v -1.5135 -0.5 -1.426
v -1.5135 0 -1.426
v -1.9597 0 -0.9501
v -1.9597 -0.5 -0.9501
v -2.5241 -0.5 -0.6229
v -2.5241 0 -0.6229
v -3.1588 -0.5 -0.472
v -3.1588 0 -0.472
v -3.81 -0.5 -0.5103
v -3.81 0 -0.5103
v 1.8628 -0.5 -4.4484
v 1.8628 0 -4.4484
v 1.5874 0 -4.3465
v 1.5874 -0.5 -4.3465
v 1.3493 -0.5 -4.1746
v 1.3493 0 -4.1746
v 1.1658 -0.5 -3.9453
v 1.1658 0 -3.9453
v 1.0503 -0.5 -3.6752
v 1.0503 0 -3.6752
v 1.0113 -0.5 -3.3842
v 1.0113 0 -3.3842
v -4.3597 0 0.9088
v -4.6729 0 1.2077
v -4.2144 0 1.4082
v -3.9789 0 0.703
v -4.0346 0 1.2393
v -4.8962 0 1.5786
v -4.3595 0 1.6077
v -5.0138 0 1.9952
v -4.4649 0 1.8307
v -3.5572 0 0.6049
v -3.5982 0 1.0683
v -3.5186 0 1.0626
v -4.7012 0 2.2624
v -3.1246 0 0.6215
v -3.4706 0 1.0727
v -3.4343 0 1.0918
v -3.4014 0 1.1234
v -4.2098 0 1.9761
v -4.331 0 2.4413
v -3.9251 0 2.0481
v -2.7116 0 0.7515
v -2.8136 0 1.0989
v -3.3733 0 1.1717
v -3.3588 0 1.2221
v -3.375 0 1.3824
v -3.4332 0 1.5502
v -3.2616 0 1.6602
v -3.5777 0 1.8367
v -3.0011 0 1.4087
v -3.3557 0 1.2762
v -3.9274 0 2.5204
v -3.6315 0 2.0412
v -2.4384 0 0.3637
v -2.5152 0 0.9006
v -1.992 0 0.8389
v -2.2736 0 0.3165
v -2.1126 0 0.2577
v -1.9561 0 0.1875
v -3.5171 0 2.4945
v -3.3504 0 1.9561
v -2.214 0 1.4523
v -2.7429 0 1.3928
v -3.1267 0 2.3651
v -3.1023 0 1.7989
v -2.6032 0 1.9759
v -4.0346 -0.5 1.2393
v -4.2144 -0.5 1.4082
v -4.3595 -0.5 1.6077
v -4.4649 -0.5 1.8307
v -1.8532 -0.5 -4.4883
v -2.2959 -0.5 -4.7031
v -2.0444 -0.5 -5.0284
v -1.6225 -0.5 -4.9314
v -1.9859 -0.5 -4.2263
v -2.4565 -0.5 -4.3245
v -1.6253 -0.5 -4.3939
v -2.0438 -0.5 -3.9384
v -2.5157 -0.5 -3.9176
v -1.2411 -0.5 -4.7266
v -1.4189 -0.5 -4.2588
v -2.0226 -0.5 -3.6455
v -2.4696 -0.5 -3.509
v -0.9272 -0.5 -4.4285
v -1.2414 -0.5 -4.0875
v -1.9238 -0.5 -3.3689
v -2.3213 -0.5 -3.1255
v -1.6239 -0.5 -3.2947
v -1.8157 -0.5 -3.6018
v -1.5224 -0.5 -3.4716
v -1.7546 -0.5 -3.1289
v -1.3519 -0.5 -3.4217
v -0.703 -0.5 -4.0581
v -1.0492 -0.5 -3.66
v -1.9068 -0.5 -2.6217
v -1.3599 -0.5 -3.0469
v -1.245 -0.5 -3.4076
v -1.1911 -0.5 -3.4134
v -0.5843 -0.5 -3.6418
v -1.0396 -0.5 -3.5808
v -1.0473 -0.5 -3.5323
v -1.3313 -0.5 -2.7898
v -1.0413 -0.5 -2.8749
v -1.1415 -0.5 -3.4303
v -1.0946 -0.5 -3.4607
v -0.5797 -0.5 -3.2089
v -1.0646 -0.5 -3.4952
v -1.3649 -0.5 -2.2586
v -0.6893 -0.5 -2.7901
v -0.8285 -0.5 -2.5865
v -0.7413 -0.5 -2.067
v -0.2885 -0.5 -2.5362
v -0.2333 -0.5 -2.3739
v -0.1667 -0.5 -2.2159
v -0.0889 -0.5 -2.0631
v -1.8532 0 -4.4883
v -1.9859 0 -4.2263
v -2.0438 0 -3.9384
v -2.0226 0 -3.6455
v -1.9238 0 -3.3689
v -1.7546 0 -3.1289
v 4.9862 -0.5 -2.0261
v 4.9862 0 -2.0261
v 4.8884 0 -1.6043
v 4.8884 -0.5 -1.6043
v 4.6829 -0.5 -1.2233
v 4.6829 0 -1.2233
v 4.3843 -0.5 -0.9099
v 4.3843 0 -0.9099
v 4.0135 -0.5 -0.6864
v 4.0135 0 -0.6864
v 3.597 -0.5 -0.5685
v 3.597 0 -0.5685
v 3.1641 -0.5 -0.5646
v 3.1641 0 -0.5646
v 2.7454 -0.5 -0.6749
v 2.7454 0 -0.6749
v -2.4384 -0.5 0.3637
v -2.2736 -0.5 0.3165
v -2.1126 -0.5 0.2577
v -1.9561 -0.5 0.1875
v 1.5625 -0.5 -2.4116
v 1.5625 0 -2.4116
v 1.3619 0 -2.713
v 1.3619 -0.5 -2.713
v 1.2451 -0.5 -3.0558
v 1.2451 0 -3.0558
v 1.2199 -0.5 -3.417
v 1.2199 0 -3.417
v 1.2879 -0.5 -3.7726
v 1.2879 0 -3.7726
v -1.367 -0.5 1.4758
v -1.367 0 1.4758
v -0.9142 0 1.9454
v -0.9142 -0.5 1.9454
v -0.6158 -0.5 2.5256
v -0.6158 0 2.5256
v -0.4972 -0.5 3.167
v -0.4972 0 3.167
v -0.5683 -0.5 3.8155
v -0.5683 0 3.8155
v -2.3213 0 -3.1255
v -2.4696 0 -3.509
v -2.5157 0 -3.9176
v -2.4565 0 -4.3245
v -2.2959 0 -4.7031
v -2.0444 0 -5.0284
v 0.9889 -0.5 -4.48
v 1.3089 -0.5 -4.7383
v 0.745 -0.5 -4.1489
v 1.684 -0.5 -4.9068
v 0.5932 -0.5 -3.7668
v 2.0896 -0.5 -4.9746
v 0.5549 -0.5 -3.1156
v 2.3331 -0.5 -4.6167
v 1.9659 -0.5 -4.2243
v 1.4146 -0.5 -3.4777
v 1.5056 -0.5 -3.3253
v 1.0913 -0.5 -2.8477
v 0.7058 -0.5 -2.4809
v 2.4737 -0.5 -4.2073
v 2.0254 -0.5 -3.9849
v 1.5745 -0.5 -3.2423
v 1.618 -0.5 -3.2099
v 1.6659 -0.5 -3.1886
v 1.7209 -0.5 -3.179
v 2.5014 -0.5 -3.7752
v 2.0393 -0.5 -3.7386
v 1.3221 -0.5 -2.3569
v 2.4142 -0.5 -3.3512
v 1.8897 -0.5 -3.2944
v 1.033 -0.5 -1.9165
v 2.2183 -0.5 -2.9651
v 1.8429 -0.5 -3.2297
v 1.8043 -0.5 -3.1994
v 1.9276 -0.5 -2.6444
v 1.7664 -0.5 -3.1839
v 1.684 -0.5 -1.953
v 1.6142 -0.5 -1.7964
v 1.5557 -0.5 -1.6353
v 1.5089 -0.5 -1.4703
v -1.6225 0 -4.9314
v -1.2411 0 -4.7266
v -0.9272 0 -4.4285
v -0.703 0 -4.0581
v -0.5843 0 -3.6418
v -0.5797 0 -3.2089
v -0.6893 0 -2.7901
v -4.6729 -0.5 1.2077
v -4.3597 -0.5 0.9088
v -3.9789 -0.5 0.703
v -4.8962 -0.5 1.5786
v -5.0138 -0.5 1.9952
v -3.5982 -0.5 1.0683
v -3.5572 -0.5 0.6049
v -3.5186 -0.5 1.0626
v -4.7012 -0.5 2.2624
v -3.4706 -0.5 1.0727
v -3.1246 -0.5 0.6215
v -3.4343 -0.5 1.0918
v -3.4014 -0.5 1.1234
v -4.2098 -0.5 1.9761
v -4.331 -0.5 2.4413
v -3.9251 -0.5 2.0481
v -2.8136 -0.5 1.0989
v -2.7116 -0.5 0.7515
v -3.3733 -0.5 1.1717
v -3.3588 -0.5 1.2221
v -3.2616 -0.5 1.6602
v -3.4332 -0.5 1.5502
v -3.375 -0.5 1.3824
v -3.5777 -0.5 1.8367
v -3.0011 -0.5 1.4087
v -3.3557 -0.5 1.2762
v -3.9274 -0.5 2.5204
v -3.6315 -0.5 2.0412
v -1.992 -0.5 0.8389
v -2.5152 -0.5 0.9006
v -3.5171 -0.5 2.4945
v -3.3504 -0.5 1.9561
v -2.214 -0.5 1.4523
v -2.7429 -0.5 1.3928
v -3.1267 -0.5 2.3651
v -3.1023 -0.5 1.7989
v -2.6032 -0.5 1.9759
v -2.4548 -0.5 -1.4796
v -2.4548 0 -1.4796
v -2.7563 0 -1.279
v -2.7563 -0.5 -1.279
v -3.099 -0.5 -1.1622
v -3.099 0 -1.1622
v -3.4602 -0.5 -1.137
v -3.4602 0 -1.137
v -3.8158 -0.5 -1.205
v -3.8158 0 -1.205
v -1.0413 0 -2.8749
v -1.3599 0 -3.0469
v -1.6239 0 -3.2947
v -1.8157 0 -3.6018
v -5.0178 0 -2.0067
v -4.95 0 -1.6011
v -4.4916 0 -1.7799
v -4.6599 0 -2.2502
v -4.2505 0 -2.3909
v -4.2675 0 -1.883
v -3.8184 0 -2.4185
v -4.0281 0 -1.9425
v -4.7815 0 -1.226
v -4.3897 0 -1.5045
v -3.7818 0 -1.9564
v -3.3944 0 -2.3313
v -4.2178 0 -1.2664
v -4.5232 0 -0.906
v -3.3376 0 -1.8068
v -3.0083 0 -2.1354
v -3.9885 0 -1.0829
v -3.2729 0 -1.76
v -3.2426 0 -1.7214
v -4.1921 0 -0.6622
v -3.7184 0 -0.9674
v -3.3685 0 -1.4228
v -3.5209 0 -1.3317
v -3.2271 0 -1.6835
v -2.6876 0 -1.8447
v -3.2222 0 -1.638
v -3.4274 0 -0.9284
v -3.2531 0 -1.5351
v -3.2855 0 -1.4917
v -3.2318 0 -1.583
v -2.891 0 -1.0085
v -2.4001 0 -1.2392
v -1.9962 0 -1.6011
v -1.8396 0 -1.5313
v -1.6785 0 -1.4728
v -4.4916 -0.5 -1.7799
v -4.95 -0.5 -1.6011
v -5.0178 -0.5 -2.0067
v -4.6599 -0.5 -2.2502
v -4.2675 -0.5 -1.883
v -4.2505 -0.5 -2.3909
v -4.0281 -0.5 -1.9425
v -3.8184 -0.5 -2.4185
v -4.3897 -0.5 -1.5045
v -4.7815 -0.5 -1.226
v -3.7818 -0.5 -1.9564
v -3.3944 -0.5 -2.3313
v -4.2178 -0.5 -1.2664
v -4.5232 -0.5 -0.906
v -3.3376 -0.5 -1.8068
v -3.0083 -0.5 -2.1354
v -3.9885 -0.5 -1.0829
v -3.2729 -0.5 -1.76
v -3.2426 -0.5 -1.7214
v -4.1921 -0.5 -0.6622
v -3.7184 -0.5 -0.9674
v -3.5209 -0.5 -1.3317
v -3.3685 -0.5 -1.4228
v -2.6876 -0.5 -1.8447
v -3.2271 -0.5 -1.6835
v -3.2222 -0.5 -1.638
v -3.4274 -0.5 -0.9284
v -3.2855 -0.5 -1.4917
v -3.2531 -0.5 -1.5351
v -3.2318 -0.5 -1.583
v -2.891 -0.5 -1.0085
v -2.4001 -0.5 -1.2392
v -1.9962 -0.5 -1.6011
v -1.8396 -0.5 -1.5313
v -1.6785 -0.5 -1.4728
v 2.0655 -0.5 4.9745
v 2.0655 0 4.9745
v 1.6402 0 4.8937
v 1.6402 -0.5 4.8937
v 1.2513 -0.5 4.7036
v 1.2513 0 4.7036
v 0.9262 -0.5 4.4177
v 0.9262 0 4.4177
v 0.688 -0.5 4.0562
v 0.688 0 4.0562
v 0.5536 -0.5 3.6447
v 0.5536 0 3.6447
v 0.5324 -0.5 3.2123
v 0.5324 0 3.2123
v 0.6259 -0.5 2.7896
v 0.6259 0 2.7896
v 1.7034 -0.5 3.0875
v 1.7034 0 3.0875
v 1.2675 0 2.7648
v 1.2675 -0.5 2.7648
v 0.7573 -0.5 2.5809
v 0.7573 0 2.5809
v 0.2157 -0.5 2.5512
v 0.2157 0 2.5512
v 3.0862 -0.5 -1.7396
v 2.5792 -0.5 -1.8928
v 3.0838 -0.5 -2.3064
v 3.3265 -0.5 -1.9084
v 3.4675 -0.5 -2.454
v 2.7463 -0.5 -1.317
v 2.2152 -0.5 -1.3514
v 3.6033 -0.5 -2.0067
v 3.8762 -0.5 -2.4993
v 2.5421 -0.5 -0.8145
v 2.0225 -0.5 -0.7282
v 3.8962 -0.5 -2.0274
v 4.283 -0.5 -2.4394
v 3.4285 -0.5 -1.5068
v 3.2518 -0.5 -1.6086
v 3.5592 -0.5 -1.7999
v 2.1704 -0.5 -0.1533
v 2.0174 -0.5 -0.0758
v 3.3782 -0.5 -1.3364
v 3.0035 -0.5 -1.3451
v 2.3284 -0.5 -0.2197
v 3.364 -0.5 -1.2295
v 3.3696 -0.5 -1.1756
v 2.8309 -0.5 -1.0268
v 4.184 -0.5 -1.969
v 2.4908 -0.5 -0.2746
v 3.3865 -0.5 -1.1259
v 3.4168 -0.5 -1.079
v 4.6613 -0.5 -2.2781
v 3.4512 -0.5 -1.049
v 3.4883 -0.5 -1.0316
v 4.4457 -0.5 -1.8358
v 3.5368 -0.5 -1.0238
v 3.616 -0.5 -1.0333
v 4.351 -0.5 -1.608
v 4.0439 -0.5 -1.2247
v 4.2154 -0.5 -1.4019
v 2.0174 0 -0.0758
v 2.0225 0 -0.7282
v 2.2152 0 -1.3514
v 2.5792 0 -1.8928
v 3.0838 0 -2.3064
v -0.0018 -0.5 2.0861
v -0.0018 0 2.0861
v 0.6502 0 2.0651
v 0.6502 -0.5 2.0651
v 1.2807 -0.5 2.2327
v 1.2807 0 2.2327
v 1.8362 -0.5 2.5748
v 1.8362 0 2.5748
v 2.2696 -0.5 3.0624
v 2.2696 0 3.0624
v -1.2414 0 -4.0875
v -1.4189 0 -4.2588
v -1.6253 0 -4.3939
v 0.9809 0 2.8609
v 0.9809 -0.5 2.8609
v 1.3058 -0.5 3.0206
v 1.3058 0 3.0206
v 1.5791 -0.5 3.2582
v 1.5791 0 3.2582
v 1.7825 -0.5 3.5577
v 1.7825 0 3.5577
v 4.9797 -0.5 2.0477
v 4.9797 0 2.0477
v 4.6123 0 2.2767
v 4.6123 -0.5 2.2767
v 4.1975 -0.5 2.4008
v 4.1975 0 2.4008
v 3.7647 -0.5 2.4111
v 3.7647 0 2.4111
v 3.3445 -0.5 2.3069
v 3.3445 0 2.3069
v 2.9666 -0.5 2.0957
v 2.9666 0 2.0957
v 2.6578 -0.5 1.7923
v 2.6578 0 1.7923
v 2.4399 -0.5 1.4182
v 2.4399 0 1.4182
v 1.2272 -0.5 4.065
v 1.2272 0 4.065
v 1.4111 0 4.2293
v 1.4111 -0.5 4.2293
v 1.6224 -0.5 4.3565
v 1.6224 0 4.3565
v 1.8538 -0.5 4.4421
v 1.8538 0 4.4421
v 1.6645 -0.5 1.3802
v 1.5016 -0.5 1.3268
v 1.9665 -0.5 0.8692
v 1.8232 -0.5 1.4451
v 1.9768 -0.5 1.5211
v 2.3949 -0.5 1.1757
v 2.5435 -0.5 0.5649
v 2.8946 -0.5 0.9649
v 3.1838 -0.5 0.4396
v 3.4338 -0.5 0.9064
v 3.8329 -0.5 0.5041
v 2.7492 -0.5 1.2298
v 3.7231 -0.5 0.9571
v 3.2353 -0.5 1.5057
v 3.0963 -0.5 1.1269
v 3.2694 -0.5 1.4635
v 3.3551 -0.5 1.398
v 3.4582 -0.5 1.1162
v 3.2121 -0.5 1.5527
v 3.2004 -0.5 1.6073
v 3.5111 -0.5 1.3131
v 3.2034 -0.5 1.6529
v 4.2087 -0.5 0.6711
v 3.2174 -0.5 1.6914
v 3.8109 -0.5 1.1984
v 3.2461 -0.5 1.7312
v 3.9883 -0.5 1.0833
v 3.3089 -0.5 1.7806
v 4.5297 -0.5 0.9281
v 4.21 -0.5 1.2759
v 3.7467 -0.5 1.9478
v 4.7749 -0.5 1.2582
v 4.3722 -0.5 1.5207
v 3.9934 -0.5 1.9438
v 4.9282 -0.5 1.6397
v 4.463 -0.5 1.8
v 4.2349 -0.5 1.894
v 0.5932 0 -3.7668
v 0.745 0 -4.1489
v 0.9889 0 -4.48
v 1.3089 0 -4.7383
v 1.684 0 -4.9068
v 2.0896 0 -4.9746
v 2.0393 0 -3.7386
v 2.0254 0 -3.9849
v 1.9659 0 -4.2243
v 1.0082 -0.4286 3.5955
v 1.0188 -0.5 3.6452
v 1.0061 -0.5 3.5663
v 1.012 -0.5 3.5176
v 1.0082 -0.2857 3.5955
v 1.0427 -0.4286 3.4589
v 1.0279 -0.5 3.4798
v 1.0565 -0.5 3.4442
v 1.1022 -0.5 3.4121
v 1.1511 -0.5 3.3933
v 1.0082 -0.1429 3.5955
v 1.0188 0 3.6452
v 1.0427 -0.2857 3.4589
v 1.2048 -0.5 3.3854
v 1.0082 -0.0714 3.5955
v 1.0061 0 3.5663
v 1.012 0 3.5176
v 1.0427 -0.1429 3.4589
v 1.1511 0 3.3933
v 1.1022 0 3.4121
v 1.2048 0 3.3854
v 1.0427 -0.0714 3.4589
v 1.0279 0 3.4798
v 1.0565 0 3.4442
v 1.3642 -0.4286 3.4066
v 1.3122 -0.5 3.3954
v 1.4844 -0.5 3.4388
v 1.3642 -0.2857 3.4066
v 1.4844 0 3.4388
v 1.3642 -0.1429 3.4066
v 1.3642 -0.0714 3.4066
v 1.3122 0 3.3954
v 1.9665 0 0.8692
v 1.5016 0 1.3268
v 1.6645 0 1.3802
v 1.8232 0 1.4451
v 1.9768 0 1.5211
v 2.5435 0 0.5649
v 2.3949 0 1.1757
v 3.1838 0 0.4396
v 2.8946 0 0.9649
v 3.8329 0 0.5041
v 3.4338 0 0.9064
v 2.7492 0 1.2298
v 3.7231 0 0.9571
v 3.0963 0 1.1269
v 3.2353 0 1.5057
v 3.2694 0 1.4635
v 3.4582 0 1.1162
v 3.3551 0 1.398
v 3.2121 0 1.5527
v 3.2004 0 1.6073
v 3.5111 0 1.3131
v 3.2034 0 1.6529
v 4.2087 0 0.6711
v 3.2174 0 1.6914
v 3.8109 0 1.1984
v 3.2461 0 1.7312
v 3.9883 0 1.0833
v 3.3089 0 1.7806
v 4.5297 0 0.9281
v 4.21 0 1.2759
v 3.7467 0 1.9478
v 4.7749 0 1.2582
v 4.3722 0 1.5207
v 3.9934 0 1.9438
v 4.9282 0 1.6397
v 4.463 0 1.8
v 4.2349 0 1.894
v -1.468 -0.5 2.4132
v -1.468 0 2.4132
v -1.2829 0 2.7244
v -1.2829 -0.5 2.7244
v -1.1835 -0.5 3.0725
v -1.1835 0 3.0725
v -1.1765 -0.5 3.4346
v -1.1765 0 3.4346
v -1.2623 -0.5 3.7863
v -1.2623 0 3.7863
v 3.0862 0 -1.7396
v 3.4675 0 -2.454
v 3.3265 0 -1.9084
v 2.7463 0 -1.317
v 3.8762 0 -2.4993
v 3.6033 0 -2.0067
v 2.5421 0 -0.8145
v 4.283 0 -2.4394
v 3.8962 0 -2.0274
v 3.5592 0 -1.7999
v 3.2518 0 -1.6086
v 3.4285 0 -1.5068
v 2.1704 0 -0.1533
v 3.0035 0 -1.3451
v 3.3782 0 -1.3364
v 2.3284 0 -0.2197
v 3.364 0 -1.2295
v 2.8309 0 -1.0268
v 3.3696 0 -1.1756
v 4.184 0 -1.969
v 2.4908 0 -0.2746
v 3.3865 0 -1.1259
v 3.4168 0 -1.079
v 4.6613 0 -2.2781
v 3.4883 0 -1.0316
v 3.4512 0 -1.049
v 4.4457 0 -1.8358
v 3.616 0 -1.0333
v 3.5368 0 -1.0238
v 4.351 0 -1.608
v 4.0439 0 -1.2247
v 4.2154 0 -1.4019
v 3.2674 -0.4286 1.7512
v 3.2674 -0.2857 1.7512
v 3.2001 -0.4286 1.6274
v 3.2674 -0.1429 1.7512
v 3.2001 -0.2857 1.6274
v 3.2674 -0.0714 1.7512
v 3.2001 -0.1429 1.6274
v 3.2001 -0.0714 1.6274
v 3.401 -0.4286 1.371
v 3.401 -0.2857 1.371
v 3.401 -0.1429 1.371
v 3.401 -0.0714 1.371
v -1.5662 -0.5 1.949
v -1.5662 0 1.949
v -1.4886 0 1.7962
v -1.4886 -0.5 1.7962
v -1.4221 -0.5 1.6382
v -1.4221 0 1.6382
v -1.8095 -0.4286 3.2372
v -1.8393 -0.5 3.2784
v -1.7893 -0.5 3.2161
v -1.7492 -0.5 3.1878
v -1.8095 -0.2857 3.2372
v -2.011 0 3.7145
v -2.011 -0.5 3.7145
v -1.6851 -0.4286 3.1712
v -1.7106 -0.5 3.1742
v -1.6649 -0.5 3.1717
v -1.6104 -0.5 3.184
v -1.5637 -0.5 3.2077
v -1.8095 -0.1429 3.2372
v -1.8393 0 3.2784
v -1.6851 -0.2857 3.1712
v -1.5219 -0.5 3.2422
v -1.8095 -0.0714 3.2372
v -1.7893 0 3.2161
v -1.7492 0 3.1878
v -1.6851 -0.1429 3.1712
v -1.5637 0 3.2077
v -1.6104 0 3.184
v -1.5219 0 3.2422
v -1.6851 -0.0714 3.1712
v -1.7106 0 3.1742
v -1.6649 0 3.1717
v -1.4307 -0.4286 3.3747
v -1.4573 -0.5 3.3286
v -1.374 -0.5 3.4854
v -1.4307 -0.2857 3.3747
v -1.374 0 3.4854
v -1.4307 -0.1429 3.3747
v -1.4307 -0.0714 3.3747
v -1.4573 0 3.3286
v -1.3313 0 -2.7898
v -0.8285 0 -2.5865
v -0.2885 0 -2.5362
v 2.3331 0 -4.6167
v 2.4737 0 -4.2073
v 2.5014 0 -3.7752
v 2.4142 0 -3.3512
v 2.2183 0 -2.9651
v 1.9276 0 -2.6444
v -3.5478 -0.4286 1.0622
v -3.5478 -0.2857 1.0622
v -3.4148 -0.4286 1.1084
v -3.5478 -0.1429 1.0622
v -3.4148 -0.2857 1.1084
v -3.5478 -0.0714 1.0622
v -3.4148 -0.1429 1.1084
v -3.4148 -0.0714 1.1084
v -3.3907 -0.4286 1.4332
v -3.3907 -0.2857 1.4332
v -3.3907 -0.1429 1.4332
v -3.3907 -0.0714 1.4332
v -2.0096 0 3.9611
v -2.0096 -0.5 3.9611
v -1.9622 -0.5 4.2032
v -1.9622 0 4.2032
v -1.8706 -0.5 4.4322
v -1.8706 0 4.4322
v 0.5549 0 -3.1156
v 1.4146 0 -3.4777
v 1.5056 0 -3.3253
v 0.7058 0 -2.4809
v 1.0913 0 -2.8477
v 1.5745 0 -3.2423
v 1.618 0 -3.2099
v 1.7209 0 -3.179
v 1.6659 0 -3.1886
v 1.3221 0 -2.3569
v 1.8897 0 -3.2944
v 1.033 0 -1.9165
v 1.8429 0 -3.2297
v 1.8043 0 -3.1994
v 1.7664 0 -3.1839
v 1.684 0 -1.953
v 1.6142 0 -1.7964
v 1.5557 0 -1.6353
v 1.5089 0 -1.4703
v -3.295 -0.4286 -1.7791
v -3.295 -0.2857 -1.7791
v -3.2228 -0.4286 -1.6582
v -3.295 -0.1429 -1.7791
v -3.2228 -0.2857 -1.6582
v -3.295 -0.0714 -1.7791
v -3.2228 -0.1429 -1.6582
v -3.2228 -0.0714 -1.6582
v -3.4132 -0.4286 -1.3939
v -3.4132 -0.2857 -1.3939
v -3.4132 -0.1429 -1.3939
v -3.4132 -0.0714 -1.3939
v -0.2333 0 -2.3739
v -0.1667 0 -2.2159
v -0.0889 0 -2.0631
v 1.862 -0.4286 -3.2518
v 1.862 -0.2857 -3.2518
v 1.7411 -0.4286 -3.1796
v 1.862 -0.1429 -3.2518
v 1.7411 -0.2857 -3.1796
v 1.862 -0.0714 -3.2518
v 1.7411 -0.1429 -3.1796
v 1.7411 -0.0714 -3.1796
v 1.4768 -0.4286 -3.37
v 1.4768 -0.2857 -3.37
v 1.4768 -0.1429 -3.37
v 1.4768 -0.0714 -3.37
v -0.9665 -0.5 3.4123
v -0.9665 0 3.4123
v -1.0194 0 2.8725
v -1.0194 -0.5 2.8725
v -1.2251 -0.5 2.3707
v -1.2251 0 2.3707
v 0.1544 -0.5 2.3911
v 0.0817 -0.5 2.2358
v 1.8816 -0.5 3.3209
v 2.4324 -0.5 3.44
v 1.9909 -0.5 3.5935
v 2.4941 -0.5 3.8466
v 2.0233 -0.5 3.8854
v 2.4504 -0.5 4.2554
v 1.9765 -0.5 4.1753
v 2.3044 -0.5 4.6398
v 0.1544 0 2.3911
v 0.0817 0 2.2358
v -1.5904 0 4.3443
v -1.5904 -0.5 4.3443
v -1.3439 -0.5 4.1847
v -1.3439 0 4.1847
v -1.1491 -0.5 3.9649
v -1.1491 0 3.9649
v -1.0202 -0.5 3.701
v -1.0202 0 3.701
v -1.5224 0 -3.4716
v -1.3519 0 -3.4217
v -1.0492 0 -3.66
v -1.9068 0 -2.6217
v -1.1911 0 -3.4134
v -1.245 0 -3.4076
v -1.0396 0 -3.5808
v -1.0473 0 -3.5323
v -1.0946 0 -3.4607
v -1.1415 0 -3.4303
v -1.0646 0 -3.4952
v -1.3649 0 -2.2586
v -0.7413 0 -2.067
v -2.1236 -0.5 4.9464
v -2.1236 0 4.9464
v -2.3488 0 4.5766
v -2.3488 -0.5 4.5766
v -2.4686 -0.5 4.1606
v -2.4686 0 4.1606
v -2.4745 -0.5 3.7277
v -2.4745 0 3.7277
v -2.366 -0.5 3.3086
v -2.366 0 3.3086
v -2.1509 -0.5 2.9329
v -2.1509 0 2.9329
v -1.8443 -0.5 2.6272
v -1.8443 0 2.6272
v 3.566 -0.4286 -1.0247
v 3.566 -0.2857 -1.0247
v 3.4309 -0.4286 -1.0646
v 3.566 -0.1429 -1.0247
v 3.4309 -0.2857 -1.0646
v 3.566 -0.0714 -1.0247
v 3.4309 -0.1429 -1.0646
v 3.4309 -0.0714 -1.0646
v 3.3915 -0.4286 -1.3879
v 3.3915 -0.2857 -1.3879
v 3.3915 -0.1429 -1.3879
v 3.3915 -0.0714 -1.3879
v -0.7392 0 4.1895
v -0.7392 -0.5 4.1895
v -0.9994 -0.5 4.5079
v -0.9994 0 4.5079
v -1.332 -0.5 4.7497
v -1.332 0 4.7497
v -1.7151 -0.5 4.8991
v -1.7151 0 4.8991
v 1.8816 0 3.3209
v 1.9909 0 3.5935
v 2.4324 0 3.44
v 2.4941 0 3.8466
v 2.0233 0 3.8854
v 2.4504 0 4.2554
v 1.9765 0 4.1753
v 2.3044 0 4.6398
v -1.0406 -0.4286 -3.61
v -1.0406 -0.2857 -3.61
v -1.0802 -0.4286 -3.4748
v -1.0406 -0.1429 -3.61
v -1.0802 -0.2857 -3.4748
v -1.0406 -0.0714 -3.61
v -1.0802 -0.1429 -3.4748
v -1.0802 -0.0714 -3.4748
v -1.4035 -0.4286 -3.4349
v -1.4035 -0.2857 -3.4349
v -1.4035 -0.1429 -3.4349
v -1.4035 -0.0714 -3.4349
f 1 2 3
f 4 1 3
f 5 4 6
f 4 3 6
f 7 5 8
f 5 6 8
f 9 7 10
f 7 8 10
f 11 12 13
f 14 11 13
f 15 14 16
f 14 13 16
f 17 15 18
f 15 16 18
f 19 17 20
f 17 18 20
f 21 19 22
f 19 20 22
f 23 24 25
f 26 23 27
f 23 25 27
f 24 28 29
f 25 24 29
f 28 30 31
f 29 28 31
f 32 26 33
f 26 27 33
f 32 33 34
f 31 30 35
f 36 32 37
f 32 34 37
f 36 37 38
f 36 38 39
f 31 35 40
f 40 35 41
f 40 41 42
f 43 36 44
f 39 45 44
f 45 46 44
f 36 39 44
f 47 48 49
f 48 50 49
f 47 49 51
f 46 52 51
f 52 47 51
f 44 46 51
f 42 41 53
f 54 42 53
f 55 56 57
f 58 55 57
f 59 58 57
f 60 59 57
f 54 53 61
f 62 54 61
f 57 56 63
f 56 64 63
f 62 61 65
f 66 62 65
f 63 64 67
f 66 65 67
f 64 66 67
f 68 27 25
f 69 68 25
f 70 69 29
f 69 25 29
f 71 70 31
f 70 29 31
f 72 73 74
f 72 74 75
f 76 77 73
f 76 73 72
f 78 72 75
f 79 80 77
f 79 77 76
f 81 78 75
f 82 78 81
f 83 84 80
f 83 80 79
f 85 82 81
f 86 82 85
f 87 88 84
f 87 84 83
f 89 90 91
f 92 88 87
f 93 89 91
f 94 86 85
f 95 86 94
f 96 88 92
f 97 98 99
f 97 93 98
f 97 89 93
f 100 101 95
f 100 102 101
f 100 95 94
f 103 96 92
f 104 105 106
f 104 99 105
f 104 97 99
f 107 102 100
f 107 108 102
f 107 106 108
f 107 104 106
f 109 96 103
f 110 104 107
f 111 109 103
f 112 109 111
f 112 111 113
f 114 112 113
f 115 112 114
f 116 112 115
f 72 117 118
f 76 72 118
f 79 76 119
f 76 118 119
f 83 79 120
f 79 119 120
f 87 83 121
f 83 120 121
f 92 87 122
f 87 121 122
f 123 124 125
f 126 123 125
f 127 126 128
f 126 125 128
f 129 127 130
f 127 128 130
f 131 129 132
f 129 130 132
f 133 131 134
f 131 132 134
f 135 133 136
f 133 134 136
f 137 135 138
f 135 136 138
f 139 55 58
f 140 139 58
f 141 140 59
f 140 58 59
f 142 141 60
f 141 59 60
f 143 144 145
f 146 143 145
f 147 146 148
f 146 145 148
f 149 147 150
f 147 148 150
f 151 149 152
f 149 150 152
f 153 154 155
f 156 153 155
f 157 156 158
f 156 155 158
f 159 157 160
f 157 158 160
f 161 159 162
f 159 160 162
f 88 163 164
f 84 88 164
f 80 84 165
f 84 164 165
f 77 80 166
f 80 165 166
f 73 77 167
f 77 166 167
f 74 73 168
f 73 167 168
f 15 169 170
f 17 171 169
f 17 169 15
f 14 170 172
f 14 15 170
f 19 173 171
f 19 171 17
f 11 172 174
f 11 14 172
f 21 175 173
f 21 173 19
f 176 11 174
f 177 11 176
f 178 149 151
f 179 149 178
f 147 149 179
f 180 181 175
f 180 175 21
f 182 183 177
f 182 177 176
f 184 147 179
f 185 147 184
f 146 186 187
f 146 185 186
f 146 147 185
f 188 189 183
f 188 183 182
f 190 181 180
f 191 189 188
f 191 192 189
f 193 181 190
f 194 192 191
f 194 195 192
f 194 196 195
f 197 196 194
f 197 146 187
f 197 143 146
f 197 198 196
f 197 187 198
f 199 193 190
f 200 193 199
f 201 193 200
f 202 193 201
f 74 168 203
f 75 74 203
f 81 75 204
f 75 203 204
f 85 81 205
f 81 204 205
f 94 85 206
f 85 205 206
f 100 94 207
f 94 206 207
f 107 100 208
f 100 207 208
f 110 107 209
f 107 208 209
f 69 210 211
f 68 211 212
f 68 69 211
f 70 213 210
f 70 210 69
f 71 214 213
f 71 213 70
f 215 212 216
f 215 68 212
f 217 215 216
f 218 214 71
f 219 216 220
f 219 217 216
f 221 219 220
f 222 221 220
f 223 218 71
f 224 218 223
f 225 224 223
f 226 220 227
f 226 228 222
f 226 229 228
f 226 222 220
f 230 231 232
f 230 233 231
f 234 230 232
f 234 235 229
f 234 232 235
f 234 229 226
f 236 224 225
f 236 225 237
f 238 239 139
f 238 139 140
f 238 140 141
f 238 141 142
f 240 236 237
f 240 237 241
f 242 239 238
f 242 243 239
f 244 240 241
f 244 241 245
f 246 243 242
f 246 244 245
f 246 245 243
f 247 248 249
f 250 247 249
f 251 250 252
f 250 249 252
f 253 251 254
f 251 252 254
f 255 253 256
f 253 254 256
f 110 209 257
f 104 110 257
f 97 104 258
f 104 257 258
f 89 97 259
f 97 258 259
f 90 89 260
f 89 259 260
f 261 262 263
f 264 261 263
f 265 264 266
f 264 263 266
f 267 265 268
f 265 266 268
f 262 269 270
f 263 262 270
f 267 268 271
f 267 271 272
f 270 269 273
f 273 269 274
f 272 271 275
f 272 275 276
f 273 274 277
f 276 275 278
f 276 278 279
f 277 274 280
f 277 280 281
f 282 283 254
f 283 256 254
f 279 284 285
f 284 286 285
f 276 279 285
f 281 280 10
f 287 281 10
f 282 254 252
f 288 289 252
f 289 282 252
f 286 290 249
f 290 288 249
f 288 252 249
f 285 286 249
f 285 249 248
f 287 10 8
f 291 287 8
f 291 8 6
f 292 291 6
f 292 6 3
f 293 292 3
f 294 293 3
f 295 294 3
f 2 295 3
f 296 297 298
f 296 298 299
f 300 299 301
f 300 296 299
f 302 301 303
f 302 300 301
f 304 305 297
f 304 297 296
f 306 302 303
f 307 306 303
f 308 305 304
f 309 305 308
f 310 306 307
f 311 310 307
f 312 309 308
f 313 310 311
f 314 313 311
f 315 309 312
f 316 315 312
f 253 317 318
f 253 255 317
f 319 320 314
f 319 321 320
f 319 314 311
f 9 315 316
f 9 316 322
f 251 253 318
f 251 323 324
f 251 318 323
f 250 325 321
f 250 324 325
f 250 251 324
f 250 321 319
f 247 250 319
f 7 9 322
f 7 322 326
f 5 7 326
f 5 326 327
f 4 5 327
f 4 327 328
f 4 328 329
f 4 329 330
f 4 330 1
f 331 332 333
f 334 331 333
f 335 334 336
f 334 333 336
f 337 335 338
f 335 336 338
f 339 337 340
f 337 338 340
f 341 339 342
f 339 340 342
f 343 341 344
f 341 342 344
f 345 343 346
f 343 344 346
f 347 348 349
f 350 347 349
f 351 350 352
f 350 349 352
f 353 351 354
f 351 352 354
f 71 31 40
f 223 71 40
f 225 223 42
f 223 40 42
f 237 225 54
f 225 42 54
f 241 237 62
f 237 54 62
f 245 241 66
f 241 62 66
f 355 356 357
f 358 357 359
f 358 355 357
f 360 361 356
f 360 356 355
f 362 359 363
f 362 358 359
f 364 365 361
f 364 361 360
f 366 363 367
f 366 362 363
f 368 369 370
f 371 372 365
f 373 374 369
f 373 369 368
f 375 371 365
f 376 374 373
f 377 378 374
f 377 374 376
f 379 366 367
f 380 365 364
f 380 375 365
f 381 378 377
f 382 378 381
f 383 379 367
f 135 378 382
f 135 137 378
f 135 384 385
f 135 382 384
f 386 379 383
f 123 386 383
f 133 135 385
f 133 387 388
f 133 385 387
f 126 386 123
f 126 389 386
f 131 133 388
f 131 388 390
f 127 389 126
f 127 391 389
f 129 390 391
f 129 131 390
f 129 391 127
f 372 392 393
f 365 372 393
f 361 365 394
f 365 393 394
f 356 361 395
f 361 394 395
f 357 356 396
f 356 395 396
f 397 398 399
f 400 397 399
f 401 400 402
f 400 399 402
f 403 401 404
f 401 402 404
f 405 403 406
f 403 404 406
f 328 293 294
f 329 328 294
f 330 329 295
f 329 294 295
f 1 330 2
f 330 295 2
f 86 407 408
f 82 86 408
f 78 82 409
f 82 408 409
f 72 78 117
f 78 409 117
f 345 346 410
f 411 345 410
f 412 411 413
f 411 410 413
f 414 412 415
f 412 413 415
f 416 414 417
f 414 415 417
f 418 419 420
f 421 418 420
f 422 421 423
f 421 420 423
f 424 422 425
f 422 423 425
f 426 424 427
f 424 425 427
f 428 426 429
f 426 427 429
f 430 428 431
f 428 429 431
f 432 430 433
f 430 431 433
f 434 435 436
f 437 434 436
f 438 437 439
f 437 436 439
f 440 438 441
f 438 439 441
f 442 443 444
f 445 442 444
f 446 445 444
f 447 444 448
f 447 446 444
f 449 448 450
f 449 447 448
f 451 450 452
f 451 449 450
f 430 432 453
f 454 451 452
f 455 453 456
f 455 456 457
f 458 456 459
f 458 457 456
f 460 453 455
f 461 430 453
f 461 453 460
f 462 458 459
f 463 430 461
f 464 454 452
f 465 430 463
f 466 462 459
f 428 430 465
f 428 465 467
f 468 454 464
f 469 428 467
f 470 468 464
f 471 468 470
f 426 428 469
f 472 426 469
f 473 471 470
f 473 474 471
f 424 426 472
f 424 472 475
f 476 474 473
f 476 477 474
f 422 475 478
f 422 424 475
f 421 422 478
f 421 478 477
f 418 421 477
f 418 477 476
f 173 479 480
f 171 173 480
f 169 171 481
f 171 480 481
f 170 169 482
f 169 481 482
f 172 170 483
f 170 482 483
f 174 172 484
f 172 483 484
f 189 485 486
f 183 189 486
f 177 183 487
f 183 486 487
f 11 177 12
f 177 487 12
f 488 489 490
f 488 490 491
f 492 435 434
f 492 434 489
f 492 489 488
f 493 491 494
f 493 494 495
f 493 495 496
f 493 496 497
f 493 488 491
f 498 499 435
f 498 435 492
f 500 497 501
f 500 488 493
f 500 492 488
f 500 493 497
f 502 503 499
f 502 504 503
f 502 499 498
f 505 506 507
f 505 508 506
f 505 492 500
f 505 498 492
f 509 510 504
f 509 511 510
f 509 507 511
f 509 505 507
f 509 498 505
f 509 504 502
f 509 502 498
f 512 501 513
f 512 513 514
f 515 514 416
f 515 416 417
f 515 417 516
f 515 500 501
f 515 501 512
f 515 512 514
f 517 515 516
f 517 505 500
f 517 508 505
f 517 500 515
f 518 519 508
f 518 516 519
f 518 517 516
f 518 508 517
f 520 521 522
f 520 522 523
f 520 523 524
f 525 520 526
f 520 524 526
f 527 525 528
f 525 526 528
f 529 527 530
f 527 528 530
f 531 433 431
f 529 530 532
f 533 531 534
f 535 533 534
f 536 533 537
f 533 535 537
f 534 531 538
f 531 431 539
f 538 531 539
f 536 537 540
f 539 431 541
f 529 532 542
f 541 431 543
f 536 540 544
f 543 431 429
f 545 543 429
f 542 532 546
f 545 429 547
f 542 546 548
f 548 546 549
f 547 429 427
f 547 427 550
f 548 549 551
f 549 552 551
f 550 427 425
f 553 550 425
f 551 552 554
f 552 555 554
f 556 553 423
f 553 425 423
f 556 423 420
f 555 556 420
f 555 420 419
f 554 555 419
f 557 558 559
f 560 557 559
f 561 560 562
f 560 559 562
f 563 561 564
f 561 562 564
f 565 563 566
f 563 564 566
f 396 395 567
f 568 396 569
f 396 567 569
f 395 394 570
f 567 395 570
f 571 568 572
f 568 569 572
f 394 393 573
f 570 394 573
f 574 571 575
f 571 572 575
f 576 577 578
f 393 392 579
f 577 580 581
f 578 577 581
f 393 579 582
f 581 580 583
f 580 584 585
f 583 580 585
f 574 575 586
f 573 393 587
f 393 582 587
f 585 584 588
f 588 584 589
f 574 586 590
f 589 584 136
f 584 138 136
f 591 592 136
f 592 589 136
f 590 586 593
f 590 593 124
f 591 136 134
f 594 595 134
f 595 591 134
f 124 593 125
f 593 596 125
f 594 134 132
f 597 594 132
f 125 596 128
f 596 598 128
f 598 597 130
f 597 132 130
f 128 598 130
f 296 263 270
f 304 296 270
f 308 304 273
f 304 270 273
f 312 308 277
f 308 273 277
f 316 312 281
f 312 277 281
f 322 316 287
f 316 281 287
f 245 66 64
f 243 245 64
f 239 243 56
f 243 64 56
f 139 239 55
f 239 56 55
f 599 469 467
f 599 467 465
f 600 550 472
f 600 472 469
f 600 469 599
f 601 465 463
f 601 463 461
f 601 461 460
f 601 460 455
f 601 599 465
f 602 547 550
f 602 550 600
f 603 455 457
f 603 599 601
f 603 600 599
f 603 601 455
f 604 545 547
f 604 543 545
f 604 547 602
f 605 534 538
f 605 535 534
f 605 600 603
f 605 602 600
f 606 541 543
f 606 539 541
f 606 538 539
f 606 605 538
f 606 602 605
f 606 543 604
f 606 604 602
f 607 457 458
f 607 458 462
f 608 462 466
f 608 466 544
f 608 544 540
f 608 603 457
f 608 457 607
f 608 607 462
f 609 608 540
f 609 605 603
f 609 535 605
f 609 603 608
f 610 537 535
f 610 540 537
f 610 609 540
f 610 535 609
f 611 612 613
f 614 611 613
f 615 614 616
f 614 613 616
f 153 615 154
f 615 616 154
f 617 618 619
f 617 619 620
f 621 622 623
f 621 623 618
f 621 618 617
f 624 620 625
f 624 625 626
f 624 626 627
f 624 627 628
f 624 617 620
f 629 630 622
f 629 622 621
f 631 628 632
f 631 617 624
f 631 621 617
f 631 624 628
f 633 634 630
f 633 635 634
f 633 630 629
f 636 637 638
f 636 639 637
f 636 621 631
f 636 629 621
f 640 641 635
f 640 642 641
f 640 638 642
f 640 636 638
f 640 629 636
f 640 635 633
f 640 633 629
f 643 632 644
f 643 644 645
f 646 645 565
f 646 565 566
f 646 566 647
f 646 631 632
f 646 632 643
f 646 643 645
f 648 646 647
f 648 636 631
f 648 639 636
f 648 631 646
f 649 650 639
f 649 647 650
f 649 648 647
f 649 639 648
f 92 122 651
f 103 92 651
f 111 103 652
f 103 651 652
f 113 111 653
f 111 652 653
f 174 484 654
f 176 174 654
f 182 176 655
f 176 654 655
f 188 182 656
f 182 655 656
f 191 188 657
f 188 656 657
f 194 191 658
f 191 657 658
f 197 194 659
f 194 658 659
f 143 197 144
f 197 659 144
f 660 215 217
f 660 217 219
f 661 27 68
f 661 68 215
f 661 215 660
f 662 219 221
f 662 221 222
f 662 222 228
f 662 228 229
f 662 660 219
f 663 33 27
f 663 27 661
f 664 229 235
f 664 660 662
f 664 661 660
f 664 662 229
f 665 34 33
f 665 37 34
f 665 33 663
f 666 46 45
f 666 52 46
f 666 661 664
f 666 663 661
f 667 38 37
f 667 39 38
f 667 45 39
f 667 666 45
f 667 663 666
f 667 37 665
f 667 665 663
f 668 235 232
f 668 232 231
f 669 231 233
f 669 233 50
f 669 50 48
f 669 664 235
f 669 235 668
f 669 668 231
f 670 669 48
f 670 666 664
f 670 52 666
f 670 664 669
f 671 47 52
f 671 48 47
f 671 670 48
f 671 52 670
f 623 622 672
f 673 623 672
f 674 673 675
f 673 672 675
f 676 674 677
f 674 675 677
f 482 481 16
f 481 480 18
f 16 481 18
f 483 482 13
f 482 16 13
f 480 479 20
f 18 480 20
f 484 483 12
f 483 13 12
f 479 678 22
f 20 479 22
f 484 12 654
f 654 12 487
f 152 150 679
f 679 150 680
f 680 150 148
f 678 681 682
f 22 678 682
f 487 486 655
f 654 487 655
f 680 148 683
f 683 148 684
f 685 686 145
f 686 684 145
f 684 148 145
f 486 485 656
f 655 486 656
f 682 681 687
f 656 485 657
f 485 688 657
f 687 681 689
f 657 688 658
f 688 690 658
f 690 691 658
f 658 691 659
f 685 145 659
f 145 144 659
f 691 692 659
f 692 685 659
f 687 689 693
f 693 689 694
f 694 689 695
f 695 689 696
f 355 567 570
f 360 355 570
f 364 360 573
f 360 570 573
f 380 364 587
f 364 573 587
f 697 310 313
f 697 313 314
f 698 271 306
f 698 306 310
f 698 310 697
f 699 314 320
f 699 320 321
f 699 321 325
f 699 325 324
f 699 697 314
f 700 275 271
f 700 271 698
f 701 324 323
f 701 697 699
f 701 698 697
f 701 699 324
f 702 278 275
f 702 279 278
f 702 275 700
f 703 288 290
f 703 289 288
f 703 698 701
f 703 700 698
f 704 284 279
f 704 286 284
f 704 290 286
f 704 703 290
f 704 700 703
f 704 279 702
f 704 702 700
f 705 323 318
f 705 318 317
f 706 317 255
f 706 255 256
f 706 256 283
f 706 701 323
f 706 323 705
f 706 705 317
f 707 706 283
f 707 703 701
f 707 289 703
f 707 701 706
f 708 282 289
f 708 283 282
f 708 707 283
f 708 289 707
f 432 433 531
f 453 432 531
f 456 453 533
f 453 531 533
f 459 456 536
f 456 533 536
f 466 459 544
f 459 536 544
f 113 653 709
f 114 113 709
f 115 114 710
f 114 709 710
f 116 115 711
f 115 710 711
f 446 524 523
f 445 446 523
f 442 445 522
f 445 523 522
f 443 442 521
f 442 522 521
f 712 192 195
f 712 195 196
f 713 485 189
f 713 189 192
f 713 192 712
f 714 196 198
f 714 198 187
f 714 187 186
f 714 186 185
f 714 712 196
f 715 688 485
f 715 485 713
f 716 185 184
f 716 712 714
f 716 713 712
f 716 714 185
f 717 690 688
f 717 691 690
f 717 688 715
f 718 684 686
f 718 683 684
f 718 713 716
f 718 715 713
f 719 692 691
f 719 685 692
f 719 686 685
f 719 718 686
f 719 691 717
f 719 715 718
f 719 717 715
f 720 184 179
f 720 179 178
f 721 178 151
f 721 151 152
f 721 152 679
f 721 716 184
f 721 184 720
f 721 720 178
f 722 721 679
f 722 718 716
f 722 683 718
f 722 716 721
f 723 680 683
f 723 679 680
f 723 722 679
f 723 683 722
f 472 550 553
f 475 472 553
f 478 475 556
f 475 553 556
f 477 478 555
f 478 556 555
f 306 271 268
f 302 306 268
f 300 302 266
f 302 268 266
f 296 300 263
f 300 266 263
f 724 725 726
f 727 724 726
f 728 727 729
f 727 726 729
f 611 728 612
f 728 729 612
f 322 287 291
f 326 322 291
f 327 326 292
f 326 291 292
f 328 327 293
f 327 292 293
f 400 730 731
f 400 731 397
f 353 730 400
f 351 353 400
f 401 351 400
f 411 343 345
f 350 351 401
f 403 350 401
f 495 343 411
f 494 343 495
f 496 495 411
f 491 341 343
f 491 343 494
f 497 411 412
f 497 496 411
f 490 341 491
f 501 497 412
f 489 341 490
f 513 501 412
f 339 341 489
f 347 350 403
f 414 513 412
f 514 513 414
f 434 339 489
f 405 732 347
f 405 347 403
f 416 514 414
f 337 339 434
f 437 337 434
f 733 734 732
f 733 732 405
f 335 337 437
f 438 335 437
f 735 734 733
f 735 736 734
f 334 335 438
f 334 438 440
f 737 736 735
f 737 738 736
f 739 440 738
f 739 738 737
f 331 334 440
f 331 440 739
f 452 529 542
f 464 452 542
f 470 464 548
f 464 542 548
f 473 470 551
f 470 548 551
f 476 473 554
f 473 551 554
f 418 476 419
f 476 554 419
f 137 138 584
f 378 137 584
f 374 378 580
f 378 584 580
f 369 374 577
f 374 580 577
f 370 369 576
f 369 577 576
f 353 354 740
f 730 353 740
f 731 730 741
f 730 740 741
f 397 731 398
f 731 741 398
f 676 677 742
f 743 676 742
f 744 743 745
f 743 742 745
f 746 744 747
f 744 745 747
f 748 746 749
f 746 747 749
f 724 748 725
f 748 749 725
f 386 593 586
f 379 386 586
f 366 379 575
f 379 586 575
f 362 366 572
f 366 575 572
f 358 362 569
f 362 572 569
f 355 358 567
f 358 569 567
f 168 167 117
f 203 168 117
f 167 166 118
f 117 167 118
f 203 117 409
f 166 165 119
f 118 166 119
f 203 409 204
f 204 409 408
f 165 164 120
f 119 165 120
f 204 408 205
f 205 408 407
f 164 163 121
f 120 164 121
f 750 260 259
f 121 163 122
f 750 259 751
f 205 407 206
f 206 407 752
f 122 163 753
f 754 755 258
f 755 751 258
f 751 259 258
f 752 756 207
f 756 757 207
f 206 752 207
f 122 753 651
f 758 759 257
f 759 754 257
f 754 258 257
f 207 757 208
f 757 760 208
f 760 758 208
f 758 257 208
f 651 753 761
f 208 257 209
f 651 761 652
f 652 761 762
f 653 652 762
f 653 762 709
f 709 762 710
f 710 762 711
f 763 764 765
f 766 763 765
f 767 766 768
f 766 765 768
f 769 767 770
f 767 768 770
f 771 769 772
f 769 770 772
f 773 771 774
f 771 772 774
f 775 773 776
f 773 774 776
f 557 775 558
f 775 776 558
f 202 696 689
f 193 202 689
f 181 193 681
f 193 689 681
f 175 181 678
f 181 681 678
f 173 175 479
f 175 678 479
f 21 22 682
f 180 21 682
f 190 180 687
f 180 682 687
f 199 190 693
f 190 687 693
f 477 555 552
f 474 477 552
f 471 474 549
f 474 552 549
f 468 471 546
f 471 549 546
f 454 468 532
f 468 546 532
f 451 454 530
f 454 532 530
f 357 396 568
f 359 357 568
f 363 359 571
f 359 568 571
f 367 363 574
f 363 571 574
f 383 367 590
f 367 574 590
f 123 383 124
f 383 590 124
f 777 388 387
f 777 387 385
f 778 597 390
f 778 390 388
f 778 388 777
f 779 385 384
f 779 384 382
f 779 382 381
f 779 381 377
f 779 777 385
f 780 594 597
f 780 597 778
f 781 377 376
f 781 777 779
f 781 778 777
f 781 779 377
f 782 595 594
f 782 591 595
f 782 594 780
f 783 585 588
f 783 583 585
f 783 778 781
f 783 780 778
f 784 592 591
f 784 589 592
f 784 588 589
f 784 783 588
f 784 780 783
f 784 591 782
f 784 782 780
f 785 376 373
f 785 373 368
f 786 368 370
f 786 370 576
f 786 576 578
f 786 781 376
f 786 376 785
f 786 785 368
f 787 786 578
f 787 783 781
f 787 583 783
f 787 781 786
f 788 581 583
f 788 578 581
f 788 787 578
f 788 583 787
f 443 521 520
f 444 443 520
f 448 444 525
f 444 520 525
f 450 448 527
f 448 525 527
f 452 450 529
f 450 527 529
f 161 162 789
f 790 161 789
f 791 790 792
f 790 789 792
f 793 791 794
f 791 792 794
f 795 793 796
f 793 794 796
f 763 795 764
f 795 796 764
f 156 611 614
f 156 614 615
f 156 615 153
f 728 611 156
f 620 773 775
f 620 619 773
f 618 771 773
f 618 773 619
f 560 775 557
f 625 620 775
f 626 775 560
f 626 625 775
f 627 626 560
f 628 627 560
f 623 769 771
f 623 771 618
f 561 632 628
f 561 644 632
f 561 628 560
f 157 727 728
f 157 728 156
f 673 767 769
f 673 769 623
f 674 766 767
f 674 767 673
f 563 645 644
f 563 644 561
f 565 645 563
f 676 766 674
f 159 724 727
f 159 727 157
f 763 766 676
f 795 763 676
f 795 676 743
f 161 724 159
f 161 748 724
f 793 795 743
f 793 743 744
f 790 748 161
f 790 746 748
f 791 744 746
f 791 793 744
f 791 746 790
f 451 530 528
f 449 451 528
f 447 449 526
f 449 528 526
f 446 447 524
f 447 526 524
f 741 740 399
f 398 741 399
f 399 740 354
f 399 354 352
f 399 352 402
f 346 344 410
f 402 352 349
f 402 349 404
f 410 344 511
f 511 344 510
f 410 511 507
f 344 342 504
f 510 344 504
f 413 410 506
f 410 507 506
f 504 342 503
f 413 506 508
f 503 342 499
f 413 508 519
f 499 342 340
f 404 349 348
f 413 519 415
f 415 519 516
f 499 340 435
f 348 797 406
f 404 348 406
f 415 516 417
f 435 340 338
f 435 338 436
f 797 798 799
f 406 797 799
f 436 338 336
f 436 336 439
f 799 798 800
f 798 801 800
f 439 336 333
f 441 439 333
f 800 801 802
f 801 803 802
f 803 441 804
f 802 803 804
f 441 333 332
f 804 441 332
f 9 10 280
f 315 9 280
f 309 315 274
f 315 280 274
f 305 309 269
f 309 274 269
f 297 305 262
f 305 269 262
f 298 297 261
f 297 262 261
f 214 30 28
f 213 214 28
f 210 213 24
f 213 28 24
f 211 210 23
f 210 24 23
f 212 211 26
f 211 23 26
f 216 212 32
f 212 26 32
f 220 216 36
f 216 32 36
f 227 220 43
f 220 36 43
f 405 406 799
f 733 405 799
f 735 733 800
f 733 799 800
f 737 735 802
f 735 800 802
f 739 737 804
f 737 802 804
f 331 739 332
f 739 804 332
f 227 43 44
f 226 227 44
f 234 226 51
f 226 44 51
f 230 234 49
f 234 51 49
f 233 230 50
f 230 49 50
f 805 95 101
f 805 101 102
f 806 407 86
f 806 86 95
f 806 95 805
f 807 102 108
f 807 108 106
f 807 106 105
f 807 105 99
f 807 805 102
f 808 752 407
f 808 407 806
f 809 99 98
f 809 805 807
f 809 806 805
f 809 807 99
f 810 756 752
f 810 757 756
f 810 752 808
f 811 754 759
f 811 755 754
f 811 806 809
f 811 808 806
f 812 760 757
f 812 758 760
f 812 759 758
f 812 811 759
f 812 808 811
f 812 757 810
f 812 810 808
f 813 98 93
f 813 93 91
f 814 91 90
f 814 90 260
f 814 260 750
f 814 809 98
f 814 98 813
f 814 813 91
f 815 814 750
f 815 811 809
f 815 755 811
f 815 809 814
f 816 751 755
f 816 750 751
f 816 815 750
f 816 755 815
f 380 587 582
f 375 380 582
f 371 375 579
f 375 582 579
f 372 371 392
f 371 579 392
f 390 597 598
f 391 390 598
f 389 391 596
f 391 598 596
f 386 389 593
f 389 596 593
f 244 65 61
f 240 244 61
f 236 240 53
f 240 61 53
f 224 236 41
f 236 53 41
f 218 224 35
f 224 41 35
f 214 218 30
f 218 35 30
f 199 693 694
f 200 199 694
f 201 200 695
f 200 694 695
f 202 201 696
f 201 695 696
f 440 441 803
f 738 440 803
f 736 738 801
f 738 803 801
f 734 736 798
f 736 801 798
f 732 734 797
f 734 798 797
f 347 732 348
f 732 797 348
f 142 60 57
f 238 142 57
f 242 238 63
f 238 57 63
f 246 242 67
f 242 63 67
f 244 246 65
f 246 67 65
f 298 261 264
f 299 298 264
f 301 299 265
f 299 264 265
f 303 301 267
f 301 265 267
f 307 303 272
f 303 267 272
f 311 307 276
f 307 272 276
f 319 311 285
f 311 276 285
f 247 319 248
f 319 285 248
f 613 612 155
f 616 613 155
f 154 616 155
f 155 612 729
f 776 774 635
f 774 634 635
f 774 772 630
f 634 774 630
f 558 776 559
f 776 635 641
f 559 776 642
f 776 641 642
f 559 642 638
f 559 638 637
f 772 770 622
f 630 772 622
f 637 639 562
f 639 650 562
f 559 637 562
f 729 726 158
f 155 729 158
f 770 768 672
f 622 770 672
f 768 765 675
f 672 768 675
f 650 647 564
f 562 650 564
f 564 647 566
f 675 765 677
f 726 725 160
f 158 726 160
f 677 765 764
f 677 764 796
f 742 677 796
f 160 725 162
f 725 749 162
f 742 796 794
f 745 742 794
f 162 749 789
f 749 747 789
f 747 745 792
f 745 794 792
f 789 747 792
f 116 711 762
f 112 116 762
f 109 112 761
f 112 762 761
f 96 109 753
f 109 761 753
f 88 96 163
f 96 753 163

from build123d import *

# Parameters (mm, degrees)
F1_DEPTH = 0.5


with BuildPart() as f1:
    # F0 (on Front) → F1 (new body)
    with BuildSketch(Plane.XZ):
        with BuildLine():
            ThreePointArc((2.2695674508, 3.0624138631), (2.4853880473, 4.0523937231), (2.0655452154, 4.9745491598))
            ThreePointArc((2.0655452154, 4.9745491598), (0.795047176, 4.2448850878), (0.6259024128, 2.7895621081))
            ThreePointArc((0.6259024128, 2.7895621081), (1.3058388146, 3.0206113104), (1.7824899998, 3.5577341008))
            add(Edge.make_bspline(
                [(1.2271529412, 4.0650115261), (1.1522471768, 3.9582157112), (1.1135112999, 3.8702569304), (0.9836132774, 3.6004845847), (1.0261006807, 3.4477428546), (1.1763697185, 3.3672644546), (1.3688798609, 3.4053202023), (1.5512433645, 3.4555677732), (1.7016130659, 3.5221553355), (1.7824899998, 3.5577341008)],
                knots=[0, 0, 0, 0, 0.1596659756, 0.3227090771, 0.4414833311, 0.5641742699, 0.7020232023, 0.8404935325, 1, 1, 1, 1], degree=3))
            ThreePointArc((1.2271529412, 4.0650115261), (1.5137912384, 4.2978850866), (1.8537720418, 4.4421232991))
            ThreePointArc((1.8537720418, 4.4421232991), (2.0169951928, 3.7383286818), (1.7033930452, 3.0874659056))
            ThreePointArc((1.7033930452, 3.0874659056), (1.019074752, 2.6542124849), (0.215717385, 2.5511736868))
            ThreePointArc((0.215717385, 2.5511736868), (0.1194471121, 2.3127941338), (-0.001781144, 2.0860862015))
            ThreePointArc((-0.001781144, 2.0860862015), (1.2806928258, 2.2327322789), (2.2695674508, 3.0624138631))
        make_face()
    extrude(amount=F1_DEPTH)


with BuildPart() as f1b:
    # F0 (on Front) → F1, piece 2 (new body)
    with BuildSketch(Plane.XZ):
        with BuildLine():
            ThreePointArc((0.5932102005, -3.7667912497), (1.1406234654, -4.6194209293), (2.0895595415, -4.9746095784))
            ThreePointArc((2.0895595415, -4.9746095784), (2.4719869073, -3.5602813859), (1.5625215686, -2.4116092291))
            ThreePointArc((1.5625215686, -2.4116092291), (1.2451103858, -3.0557733273), (1.287870268, -3.7726197801))
            add(Edge.make_bspline(
                [(2.0392521754, -3.7386364875), (2.0167025044, -3.6101540686), (1.9818966553, -3.520567417), (1.8829905728, -3.2379577894), (1.7449427287, -3.1599962072), (1.5817796507, -3.2093456405), (1.4725639008, -3.3723803449), (1.3791438289, -3.5368612131), (1.3199009102, -3.6902731655), (1.287870268, -3.7726197801)],
                knots=[0, 0, 0, 0, 0.1596659756, 0.3227090771, 0.4414833311, 0.5641742699, 0.7020232023, 0.8404935325, 1, 1, 1, 1], degree=3))
            ThreePointArc((2.0392521754, -3.7386364875), (2.0012347654, -4.105986845), (1.862823852, -4.4483813947))
            ThreePointArc((1.862823852, -4.4483813947), (1.2497497086, -4.0661396451), (1.0112704311, -3.3841599573))
            ThreePointArc((1.0112704311, -3.3841599573), (1.188800105, -2.59391742), (1.684000114, -1.9529985452))
            ThreePointArc((1.684000114, -1.9529985452), (1.5835136784, -1.716365384), (1.5089282841, -1.4703373457))
            ThreePointArc((1.5089282841, -1.4703373457), (0.7057766791, -2.4808778222), (0.5932102005, -3.7667912497))
        make_face()
    extrude(amount=F1_DEPTH)


with BuildPart() as f1c:
    # F0 (on Front) → F1, piece 3 (new body)
    with BuildSketch(Plane.XZ):
        with BuildLine():
            ThreePointArc((-3.8099945255, -0.5103224409), (-4.6626242051, -1.0577357058), (-5.0178128542, -2.0066717819))
            ThreePointArc((-5.0178128542, -2.0066717819), (-3.6034846617, -2.3890991477), (-2.4548125049, -1.479633809))
            ThreePointArc((-2.4548125049, -1.479633809), (-3.0989766031, -1.1622226262), (-3.8158230559, -1.2049825084))
            add(Edge.make_bspline(
                [(-3.7818397632, -1.9563644158), (-3.6533573444, -1.9338147448), (-3.5637706928, -1.8990088957), (-3.2811610652, -1.8001028132), (-3.203199483, -1.6620549691), (-3.2525489163, -1.4988918911), (-3.4155836207, -1.3896761412), (-3.5800644889, -1.2962560693), (-3.7334764413, -1.2370131505), (-3.8158230559, -1.2049825084)],
                knots=[0, 0, 0, 0, 0.1596659756, 0.3227090771, 0.4414833311, 0.5641742699, 0.7020232023, 0.8404935325, 1, 1, 1, 1], degree=3))
            ThreePointArc((-3.7818397632, -1.9563644158), (-4.1491901208, -1.9183470058), (-4.4915846705, -1.7799360924))
            ThreePointArc((-4.4915846705, -1.7799360924), (-4.1093429209, -1.166861949), (-3.4273632331, -0.9283826715))
            ThreePointArc((-3.4273632331, -0.9283826715), (-2.6371206958, -1.1059123454), (-1.996201821, -1.6011123544))
            ThreePointArc((-1.996201821, -1.6011123544), (-1.7595686598, -1.5006259188), (-1.5135406215, -1.4260405245))
            ThreePointArc((-1.5135406215, -1.4260405245), (-2.524081098, -0.6228889195), (-3.8099945255, -0.5103224409))
        make_face()
    extrude(amount=F1_DEPTH)


with BuildPart() as f1d:
    # F0 (on Front) → F1, piece 4 (new body)
    with BuildSketch(Plane.XZ):
        with BuildLine():
            ThreePointArc((-0.568260898, 3.8155194758), (-1.1579671121, 4.6394643975), (-2.1236047072, 4.9463563784))
            ThreePointArc((-2.1236047072, 4.9463563784), (-2.4342359078, 3.5145452234), (-1.4680117809, 2.4131888493))
            ThreePointArc((-1.4680117809, 2.4131888493), (-1.1834827576, 3.0725373757), (-1.2623313175, 3.7863161573))
            add(Edge.make_bspline(
                [(-2.0110441405, 3.7144917627), (-1.9820451263, 3.5873097011), (-1.9427666288, 3.499591887), (-1.829737297, 3.2223285015), (-1.6879342458, 3.1514263843), (-1.527466866, 3.2089396575), (-1.4266101582, 3.3772736094), (-1.3416019533, 3.546255475), (-1.2901693429, 3.7024593071), (-1.2623313175, 3.7863161573)],
                knots=[0, 0, 0, 0, 0.1596659756, 0.3227090771, 0.4414833311, 0.5641742699, 0.7020232023, 0.8404935325, 1, 1, 1, 1], degree=3))
            ThreePointArc((-2.0110441405, 3.7144917627), (-1.991596717, 4.0832917171), (-1.8706252179, 4.4322293978))
            ThreePointArc((-1.8706252179, 4.4322293978), (-1.239058377, 4.0813847229), (-0.966497318, 3.4122964406))
            ThreePointArc((-0.966497318, 3.4122964406), (-1.1039575375, 2.6141080286), (-1.5662128847, 1.9490365687))
            ThreePointArc((-1.5662128847, 1.9490365687), (-1.4539233219, 1.717770854), (-1.3670281721, 1.4758162929))
            ThreePointArc((-1.3670281721, 1.4758162929), (-0.6158490526, 2.5255660182), (-0.568260898, 3.8155194758))
        make_face()
    extrude(amount=F1_DEPTH)


with BuildPart() as f1e:
    # F0 (on Front) → F1, piece 5 (new body)
    with BuildSketch(Plane.XZ):
        with BuildLine():
            ThreePointArc((-2.3213258776, -3.1254688842), (-2.4991871955, -4.1229677587), (-2.0444385116, -5.0284191862))
            ThreePointArc((-2.0444385116, -5.0284191862), (-0.8027288935, -4.2507739262), (-0.6892782612, -2.790053597))
            ThreePointArc((-0.6892782612, -2.790053597), (-1.3598962922, -3.0468973254), (-1.8156900956, -3.6018290809))
            add(Edge.make_bspline(
                [(-1.2413879079, -4.0875312861), (-1.1706147162, -3.9779531179), (-1.1352657509, -3.888579375), (-1.0157635833, -3.614043682), (-1.0640523668, -3.4630357056), (-1.2172848415, -3.3883539455), (-1.4082014478, -3.4337328421), (-1.5885132767, -3.4909072263), (-1.7362307019, -3.563188018), (-1.8156900956, -3.6018290809)],
                knots=[0, 0, 0, 0, 0.1596659756, 0.3227090771, 0.4414833311, 0.5641742699, 0.7020232023, 0.8404935325, 1, 1, 1, 1], degree=3))
            ThreePointArc((-1.2413879079, -4.0875312861), (-1.5189250021, -4.3311801523), (-1.8531501961, -4.4882951685))
            ThreePointArc((-1.8531501961, -4.4882951685), (-2.0431283523, -3.791246418), (-1.75460778, -3.128883572))
            ThreePointArc((-1.75460778, -3.128883572), (-1.0873321194, -2.6698157711), (-0.2884951206, -2.5361763223))
            ThreePointArc((-0.2884951206, -2.5361763223), (-0.2013974601, -2.2942945862), (-0.0889143431, -2.0631229507))
            ThreePointArc((-0.0889143431, -2.0631229507), (-1.364853406, -2.2586327023), (-2.3213258776, -3.1254688842))
        make_face()
    extrude(amount=F1_DEPTH)


with BuildPart() as f1f:
    # F0 (on Front) → F1, piece 6 (new body)
    with BuildSketch(Plane.XZ):
        with BuildLine():
            ThreePointArc((3.8329332791, 0.5040715362), (4.6628891361, 1.0852874413), (4.9796788934, 2.0477233627))
            ThreePointArc((4.9796788934, 2.0477233627), (3.5511323712, 2.3730382256), (2.4399140707, 1.4181723635))
            ThreePointArc((2.4399140707, 1.4181723635), (3.0963066608, 1.1268889756), (3.8108573409, 1.1984051981))
            add(Edge.make_bspline(
                [(3.7467235722, 1.9478159631), (3.6192504883, 1.9201242226), (3.5311340352, 1.8817483712), (3.2527248198, 1.771571588), (3.1803705843, 1.6305039441), (3.2362333493, 1.4694545477), (3.4035229596, 1.3668749145), (3.5716231619, 1.2801362968), (3.7272907161, 1.2271026929), (3.8108573409, 1.1984051981)],
                knots=[0, 0, 0, 0, 0.1596659756, 0.3227090771, 0.4414833311, 0.5641742699, 0.7020232023, 0.8404935325, 1, 1, 1, 1], degree=3))
            ThreePointArc((3.7467235722, 1.9478159631), (4.1153044276, 1.9245831911), (4.4629817347, 1.8000356149))
            ThreePointArc((4.4629817347, 1.8000356149), (4.1056714178, 1.1721040917), (3.4338200857, 0.9064267539))
            ThreePointArc((3.4338200857, 0.9064267539), (2.6370850102, 1.0520745221), (1.9767944582, 1.5211336228))
            ThreePointArc((1.9767944582, 1.5211336228), (1.7443880845, 1.4112243233), (1.5015541454, 1.326817838))
            ThreePointArc((1.5015541454, 1.326817838), (2.5435363829, 0.5649008006), (3.8329332791, 0.5040715362))
        make_face()
    extrude(amount=F1_DEPTH)


with BuildPart() as f1g:
    # F0 (on Front) → F1, piece 7 (new body)
    with BuildSketch(Plane.XZ):
        with BuildLine():
            ThreePointArc((-3.1267156466, 2.3651326869), (-4.1317383387, 2.4938495909), (-5.0137929817, 1.9952332457))
            ThreePointArc((-5.0137929817, 1.9952332457), (-4.1761743015, 0.7931642491), (-2.7116473276, 0.751502888))
            ThreePointArc((-2.7116473276, 0.751502888), (-3.00107768, 1.4087146617), (-3.5776994442, 1.8367387095))
            add(Edge.make_bspline(
                [(-4.0346457119, 1.2393027352), (-3.9217278198, 1.1739898785), (-3.8307276946, 1.1430675161), (-3.5506605555, 1.037176004), (-3.402203075, 1.0928140488), (-3.3351277292, 1.2495254223), (-3.3898170277, 1.4379862285), (-3.4557674181, 1.6152764195), (-3.5352071776, 1.7592704304), (-3.5776994442, 1.8367387095)],
                knots=[0, 0, 0, 0, 0.1596659756, 0.3227090771, 0.4414833311, 0.5641742699, 0.7020232023, 0.8404935325, 1, 1, 1, 1], degree=3))
            ThreePointArc((-4.0346457119, 1.2393027352), (-4.2916152919, 1.5045540191), (-4.4649359139, 1.8306699043))
            ThreePointArc((-4.4649359139, 1.8306699043), (-3.7780452825, 2.0546116845), (-3.1023270076, 1.7989293165))
            ThreePointArc((-3.1023270076, 1.7989293165), (-2.6110799779, 1.1549755847), (-2.4384160655, 0.363655658))
            ThreePointArc((-2.4384160655, 0.363655658), (-2.1925531116, 0.2885278696), (-1.9561421326, 0.1875198218))
            ThreePointArc((-1.9561421326, 0.1875198218), (-2.2140051488, 1.4523325431), (-3.1267156466, 2.3651326869))
        make_face()
    extrude(amount=F1_DEPTH)


with BuildPart() as f1h:
    # F0 (on Front) → F1, piece 8 (new body)
    with BuildSketch(Plane.XZ):
        with BuildLine():
            ThreePointArc((3.0837530583, -2.3063576468), (4.0815672397, -2.4824414693), (4.9862070183, -2.0260802922))
            ThreePointArc((4.9862070183, -2.0260802922), (4.2063506767, -0.7857581516), (2.7454305344, -0.6749102198))
            ThreePointArc((2.7454305344, -0.6749102198), (3.0034686747, -1.3450695759), (3.5592116232, -1.799873951))
            add(Edge.make_bspline(
                [(4.043889841, -1.2247073141), (3.9341857522, -1.1541294669), (3.844749171, -1.1189397921), (3.5700010004, -0.999926946), (3.4190792983, -1.0484846991), (3.3446706664, -1.2018499887), (3.3903896412, -1.3926854419), (3.4478851907, -1.5728951187), (3.5204290512, -1.7204835291), (3.5592116232, -1.799873951)],
                knots=[0, 0, 0, 0, 0.1596659756, 0.3227090771, 0.4414833311, 0.5641742699, 0.7020232023, 0.8404935325, 1, 1, 1, 1], degree=3))
            ThreePointArc((4.043889841, -1.2247073141), (4.2880327998, -1.5018098661), (4.4457430453, -1.8357546027))
            ThreePointArc((4.4457430453, -1.8357546027), (3.7490338794, -2.0269743676), (3.0861580364, -1.7396343648))
            ThreePointArc((3.0861580364, -1.7396343648), (2.6259020997, -1.0731776703), (2.4908395996, -0.2745800407))
            ThreePointArc((2.4908395996, -0.2745800407), (2.2488030682, -0.1879134717), (2.0174313919, -0.0758424047))
            ThreePointArc((2.0174313919, -0.0758424047), (2.2152141346, -1.3514311087), (3.0837530583, -2.3063576468))
        make_face()
    extrude(amount=F1_DEPTH)


solid = Compound([f1.part, f1b.part, f1c.part, f1d.part, f1e.part, f1f.part, f1g.part, f1h.part])
